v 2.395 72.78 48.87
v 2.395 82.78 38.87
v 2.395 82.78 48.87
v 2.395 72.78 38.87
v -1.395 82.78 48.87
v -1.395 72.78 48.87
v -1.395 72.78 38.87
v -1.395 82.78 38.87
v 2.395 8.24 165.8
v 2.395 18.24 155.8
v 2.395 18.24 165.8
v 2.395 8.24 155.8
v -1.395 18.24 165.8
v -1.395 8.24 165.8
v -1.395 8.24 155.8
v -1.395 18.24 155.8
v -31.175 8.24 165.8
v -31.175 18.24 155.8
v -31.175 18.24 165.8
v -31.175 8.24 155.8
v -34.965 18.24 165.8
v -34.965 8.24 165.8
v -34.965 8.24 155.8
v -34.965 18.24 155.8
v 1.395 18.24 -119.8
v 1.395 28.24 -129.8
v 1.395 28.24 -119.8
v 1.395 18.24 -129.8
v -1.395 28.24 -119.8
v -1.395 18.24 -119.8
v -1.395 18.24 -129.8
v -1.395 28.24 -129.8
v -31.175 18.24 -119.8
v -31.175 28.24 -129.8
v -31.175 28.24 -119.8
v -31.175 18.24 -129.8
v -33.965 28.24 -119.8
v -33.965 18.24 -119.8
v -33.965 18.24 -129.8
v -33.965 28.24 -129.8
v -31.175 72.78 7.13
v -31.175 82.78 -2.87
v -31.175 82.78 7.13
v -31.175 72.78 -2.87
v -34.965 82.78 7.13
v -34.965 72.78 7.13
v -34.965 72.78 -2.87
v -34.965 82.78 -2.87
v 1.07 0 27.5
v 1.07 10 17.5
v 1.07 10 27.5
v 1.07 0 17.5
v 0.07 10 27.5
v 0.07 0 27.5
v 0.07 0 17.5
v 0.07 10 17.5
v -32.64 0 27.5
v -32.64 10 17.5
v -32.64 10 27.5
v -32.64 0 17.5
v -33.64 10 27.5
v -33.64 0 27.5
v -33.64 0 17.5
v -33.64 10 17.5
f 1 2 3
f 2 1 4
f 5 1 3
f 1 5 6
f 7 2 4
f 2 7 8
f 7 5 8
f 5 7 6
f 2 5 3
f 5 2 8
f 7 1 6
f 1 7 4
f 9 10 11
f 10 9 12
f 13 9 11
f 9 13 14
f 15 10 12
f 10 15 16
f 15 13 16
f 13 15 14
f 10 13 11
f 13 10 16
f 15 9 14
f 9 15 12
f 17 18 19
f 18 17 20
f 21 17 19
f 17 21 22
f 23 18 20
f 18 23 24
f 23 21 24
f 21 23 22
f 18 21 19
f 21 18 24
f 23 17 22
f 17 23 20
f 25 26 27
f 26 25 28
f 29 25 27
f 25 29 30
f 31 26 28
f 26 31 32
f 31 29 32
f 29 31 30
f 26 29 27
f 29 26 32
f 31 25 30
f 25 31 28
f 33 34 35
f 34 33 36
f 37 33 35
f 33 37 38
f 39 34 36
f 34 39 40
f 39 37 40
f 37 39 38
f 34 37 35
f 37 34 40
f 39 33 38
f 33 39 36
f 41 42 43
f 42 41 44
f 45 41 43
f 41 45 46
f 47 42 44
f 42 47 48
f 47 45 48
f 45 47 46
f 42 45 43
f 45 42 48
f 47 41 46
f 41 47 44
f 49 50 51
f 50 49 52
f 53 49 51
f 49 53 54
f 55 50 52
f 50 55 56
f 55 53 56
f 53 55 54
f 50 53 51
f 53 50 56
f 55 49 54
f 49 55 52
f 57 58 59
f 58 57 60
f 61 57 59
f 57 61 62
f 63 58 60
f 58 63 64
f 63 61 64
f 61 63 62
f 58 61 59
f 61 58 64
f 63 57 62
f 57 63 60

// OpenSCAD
$fa = 12;
$fs = 1.0;

union() {
	color(alpha = 1.0, c = "pink") {
		translate(v = [0.5, 77.78, 43.87]) {
			cube(center = true, size = [3.79, 10, 10]);
		}
	}
	color(alpha = 1.0, c = "pink") {
		translate(v = [0.5, 13.24, 160.8]) {
			cube(center = true, size = [3.79, 10, 10]);
		}
	}
	color(alpha = 1.0, c = "pink") {
		translate(v = [-33.07, 13.24, 160.8]) {
			cube(center = true, size = [3.79, 10, 10]);
		}
	}
	color(alpha = 1.0, c = "pink") {
		translate(v = [0.0, 23.24, -124.8]) {
			cube(center = true, size = [2.79, 10, 10]);
		}
	}
	color(alpha = 1.0, c = "pink") {
		translate(v = [-32.57, 23.24, -124.8]) {
			cube(center = true, size = [2.79, 10, 10]);
		}
	}
	color(alpha = 1.0, c = "pink") {
		translate(v = [-33.07, 77.78, 2.13]) {
			cube(center = true, size = [3.79, 10, 10]);
		}
	}
	color(alpha = 1.0, c = "pink") {
		translate(v = [0.57, 5.0, 22.5]) {
			cube(center = true, size = [1.0, 10.0, 10.0]);
		}
	}
	color(alpha = 1.0, c = "pink") {
		translate(v = [-33.14, 5.0, 22.5]) {
			cube(center = true, size = [1.0, 10.0, 10.0]);
		}
	}
}
